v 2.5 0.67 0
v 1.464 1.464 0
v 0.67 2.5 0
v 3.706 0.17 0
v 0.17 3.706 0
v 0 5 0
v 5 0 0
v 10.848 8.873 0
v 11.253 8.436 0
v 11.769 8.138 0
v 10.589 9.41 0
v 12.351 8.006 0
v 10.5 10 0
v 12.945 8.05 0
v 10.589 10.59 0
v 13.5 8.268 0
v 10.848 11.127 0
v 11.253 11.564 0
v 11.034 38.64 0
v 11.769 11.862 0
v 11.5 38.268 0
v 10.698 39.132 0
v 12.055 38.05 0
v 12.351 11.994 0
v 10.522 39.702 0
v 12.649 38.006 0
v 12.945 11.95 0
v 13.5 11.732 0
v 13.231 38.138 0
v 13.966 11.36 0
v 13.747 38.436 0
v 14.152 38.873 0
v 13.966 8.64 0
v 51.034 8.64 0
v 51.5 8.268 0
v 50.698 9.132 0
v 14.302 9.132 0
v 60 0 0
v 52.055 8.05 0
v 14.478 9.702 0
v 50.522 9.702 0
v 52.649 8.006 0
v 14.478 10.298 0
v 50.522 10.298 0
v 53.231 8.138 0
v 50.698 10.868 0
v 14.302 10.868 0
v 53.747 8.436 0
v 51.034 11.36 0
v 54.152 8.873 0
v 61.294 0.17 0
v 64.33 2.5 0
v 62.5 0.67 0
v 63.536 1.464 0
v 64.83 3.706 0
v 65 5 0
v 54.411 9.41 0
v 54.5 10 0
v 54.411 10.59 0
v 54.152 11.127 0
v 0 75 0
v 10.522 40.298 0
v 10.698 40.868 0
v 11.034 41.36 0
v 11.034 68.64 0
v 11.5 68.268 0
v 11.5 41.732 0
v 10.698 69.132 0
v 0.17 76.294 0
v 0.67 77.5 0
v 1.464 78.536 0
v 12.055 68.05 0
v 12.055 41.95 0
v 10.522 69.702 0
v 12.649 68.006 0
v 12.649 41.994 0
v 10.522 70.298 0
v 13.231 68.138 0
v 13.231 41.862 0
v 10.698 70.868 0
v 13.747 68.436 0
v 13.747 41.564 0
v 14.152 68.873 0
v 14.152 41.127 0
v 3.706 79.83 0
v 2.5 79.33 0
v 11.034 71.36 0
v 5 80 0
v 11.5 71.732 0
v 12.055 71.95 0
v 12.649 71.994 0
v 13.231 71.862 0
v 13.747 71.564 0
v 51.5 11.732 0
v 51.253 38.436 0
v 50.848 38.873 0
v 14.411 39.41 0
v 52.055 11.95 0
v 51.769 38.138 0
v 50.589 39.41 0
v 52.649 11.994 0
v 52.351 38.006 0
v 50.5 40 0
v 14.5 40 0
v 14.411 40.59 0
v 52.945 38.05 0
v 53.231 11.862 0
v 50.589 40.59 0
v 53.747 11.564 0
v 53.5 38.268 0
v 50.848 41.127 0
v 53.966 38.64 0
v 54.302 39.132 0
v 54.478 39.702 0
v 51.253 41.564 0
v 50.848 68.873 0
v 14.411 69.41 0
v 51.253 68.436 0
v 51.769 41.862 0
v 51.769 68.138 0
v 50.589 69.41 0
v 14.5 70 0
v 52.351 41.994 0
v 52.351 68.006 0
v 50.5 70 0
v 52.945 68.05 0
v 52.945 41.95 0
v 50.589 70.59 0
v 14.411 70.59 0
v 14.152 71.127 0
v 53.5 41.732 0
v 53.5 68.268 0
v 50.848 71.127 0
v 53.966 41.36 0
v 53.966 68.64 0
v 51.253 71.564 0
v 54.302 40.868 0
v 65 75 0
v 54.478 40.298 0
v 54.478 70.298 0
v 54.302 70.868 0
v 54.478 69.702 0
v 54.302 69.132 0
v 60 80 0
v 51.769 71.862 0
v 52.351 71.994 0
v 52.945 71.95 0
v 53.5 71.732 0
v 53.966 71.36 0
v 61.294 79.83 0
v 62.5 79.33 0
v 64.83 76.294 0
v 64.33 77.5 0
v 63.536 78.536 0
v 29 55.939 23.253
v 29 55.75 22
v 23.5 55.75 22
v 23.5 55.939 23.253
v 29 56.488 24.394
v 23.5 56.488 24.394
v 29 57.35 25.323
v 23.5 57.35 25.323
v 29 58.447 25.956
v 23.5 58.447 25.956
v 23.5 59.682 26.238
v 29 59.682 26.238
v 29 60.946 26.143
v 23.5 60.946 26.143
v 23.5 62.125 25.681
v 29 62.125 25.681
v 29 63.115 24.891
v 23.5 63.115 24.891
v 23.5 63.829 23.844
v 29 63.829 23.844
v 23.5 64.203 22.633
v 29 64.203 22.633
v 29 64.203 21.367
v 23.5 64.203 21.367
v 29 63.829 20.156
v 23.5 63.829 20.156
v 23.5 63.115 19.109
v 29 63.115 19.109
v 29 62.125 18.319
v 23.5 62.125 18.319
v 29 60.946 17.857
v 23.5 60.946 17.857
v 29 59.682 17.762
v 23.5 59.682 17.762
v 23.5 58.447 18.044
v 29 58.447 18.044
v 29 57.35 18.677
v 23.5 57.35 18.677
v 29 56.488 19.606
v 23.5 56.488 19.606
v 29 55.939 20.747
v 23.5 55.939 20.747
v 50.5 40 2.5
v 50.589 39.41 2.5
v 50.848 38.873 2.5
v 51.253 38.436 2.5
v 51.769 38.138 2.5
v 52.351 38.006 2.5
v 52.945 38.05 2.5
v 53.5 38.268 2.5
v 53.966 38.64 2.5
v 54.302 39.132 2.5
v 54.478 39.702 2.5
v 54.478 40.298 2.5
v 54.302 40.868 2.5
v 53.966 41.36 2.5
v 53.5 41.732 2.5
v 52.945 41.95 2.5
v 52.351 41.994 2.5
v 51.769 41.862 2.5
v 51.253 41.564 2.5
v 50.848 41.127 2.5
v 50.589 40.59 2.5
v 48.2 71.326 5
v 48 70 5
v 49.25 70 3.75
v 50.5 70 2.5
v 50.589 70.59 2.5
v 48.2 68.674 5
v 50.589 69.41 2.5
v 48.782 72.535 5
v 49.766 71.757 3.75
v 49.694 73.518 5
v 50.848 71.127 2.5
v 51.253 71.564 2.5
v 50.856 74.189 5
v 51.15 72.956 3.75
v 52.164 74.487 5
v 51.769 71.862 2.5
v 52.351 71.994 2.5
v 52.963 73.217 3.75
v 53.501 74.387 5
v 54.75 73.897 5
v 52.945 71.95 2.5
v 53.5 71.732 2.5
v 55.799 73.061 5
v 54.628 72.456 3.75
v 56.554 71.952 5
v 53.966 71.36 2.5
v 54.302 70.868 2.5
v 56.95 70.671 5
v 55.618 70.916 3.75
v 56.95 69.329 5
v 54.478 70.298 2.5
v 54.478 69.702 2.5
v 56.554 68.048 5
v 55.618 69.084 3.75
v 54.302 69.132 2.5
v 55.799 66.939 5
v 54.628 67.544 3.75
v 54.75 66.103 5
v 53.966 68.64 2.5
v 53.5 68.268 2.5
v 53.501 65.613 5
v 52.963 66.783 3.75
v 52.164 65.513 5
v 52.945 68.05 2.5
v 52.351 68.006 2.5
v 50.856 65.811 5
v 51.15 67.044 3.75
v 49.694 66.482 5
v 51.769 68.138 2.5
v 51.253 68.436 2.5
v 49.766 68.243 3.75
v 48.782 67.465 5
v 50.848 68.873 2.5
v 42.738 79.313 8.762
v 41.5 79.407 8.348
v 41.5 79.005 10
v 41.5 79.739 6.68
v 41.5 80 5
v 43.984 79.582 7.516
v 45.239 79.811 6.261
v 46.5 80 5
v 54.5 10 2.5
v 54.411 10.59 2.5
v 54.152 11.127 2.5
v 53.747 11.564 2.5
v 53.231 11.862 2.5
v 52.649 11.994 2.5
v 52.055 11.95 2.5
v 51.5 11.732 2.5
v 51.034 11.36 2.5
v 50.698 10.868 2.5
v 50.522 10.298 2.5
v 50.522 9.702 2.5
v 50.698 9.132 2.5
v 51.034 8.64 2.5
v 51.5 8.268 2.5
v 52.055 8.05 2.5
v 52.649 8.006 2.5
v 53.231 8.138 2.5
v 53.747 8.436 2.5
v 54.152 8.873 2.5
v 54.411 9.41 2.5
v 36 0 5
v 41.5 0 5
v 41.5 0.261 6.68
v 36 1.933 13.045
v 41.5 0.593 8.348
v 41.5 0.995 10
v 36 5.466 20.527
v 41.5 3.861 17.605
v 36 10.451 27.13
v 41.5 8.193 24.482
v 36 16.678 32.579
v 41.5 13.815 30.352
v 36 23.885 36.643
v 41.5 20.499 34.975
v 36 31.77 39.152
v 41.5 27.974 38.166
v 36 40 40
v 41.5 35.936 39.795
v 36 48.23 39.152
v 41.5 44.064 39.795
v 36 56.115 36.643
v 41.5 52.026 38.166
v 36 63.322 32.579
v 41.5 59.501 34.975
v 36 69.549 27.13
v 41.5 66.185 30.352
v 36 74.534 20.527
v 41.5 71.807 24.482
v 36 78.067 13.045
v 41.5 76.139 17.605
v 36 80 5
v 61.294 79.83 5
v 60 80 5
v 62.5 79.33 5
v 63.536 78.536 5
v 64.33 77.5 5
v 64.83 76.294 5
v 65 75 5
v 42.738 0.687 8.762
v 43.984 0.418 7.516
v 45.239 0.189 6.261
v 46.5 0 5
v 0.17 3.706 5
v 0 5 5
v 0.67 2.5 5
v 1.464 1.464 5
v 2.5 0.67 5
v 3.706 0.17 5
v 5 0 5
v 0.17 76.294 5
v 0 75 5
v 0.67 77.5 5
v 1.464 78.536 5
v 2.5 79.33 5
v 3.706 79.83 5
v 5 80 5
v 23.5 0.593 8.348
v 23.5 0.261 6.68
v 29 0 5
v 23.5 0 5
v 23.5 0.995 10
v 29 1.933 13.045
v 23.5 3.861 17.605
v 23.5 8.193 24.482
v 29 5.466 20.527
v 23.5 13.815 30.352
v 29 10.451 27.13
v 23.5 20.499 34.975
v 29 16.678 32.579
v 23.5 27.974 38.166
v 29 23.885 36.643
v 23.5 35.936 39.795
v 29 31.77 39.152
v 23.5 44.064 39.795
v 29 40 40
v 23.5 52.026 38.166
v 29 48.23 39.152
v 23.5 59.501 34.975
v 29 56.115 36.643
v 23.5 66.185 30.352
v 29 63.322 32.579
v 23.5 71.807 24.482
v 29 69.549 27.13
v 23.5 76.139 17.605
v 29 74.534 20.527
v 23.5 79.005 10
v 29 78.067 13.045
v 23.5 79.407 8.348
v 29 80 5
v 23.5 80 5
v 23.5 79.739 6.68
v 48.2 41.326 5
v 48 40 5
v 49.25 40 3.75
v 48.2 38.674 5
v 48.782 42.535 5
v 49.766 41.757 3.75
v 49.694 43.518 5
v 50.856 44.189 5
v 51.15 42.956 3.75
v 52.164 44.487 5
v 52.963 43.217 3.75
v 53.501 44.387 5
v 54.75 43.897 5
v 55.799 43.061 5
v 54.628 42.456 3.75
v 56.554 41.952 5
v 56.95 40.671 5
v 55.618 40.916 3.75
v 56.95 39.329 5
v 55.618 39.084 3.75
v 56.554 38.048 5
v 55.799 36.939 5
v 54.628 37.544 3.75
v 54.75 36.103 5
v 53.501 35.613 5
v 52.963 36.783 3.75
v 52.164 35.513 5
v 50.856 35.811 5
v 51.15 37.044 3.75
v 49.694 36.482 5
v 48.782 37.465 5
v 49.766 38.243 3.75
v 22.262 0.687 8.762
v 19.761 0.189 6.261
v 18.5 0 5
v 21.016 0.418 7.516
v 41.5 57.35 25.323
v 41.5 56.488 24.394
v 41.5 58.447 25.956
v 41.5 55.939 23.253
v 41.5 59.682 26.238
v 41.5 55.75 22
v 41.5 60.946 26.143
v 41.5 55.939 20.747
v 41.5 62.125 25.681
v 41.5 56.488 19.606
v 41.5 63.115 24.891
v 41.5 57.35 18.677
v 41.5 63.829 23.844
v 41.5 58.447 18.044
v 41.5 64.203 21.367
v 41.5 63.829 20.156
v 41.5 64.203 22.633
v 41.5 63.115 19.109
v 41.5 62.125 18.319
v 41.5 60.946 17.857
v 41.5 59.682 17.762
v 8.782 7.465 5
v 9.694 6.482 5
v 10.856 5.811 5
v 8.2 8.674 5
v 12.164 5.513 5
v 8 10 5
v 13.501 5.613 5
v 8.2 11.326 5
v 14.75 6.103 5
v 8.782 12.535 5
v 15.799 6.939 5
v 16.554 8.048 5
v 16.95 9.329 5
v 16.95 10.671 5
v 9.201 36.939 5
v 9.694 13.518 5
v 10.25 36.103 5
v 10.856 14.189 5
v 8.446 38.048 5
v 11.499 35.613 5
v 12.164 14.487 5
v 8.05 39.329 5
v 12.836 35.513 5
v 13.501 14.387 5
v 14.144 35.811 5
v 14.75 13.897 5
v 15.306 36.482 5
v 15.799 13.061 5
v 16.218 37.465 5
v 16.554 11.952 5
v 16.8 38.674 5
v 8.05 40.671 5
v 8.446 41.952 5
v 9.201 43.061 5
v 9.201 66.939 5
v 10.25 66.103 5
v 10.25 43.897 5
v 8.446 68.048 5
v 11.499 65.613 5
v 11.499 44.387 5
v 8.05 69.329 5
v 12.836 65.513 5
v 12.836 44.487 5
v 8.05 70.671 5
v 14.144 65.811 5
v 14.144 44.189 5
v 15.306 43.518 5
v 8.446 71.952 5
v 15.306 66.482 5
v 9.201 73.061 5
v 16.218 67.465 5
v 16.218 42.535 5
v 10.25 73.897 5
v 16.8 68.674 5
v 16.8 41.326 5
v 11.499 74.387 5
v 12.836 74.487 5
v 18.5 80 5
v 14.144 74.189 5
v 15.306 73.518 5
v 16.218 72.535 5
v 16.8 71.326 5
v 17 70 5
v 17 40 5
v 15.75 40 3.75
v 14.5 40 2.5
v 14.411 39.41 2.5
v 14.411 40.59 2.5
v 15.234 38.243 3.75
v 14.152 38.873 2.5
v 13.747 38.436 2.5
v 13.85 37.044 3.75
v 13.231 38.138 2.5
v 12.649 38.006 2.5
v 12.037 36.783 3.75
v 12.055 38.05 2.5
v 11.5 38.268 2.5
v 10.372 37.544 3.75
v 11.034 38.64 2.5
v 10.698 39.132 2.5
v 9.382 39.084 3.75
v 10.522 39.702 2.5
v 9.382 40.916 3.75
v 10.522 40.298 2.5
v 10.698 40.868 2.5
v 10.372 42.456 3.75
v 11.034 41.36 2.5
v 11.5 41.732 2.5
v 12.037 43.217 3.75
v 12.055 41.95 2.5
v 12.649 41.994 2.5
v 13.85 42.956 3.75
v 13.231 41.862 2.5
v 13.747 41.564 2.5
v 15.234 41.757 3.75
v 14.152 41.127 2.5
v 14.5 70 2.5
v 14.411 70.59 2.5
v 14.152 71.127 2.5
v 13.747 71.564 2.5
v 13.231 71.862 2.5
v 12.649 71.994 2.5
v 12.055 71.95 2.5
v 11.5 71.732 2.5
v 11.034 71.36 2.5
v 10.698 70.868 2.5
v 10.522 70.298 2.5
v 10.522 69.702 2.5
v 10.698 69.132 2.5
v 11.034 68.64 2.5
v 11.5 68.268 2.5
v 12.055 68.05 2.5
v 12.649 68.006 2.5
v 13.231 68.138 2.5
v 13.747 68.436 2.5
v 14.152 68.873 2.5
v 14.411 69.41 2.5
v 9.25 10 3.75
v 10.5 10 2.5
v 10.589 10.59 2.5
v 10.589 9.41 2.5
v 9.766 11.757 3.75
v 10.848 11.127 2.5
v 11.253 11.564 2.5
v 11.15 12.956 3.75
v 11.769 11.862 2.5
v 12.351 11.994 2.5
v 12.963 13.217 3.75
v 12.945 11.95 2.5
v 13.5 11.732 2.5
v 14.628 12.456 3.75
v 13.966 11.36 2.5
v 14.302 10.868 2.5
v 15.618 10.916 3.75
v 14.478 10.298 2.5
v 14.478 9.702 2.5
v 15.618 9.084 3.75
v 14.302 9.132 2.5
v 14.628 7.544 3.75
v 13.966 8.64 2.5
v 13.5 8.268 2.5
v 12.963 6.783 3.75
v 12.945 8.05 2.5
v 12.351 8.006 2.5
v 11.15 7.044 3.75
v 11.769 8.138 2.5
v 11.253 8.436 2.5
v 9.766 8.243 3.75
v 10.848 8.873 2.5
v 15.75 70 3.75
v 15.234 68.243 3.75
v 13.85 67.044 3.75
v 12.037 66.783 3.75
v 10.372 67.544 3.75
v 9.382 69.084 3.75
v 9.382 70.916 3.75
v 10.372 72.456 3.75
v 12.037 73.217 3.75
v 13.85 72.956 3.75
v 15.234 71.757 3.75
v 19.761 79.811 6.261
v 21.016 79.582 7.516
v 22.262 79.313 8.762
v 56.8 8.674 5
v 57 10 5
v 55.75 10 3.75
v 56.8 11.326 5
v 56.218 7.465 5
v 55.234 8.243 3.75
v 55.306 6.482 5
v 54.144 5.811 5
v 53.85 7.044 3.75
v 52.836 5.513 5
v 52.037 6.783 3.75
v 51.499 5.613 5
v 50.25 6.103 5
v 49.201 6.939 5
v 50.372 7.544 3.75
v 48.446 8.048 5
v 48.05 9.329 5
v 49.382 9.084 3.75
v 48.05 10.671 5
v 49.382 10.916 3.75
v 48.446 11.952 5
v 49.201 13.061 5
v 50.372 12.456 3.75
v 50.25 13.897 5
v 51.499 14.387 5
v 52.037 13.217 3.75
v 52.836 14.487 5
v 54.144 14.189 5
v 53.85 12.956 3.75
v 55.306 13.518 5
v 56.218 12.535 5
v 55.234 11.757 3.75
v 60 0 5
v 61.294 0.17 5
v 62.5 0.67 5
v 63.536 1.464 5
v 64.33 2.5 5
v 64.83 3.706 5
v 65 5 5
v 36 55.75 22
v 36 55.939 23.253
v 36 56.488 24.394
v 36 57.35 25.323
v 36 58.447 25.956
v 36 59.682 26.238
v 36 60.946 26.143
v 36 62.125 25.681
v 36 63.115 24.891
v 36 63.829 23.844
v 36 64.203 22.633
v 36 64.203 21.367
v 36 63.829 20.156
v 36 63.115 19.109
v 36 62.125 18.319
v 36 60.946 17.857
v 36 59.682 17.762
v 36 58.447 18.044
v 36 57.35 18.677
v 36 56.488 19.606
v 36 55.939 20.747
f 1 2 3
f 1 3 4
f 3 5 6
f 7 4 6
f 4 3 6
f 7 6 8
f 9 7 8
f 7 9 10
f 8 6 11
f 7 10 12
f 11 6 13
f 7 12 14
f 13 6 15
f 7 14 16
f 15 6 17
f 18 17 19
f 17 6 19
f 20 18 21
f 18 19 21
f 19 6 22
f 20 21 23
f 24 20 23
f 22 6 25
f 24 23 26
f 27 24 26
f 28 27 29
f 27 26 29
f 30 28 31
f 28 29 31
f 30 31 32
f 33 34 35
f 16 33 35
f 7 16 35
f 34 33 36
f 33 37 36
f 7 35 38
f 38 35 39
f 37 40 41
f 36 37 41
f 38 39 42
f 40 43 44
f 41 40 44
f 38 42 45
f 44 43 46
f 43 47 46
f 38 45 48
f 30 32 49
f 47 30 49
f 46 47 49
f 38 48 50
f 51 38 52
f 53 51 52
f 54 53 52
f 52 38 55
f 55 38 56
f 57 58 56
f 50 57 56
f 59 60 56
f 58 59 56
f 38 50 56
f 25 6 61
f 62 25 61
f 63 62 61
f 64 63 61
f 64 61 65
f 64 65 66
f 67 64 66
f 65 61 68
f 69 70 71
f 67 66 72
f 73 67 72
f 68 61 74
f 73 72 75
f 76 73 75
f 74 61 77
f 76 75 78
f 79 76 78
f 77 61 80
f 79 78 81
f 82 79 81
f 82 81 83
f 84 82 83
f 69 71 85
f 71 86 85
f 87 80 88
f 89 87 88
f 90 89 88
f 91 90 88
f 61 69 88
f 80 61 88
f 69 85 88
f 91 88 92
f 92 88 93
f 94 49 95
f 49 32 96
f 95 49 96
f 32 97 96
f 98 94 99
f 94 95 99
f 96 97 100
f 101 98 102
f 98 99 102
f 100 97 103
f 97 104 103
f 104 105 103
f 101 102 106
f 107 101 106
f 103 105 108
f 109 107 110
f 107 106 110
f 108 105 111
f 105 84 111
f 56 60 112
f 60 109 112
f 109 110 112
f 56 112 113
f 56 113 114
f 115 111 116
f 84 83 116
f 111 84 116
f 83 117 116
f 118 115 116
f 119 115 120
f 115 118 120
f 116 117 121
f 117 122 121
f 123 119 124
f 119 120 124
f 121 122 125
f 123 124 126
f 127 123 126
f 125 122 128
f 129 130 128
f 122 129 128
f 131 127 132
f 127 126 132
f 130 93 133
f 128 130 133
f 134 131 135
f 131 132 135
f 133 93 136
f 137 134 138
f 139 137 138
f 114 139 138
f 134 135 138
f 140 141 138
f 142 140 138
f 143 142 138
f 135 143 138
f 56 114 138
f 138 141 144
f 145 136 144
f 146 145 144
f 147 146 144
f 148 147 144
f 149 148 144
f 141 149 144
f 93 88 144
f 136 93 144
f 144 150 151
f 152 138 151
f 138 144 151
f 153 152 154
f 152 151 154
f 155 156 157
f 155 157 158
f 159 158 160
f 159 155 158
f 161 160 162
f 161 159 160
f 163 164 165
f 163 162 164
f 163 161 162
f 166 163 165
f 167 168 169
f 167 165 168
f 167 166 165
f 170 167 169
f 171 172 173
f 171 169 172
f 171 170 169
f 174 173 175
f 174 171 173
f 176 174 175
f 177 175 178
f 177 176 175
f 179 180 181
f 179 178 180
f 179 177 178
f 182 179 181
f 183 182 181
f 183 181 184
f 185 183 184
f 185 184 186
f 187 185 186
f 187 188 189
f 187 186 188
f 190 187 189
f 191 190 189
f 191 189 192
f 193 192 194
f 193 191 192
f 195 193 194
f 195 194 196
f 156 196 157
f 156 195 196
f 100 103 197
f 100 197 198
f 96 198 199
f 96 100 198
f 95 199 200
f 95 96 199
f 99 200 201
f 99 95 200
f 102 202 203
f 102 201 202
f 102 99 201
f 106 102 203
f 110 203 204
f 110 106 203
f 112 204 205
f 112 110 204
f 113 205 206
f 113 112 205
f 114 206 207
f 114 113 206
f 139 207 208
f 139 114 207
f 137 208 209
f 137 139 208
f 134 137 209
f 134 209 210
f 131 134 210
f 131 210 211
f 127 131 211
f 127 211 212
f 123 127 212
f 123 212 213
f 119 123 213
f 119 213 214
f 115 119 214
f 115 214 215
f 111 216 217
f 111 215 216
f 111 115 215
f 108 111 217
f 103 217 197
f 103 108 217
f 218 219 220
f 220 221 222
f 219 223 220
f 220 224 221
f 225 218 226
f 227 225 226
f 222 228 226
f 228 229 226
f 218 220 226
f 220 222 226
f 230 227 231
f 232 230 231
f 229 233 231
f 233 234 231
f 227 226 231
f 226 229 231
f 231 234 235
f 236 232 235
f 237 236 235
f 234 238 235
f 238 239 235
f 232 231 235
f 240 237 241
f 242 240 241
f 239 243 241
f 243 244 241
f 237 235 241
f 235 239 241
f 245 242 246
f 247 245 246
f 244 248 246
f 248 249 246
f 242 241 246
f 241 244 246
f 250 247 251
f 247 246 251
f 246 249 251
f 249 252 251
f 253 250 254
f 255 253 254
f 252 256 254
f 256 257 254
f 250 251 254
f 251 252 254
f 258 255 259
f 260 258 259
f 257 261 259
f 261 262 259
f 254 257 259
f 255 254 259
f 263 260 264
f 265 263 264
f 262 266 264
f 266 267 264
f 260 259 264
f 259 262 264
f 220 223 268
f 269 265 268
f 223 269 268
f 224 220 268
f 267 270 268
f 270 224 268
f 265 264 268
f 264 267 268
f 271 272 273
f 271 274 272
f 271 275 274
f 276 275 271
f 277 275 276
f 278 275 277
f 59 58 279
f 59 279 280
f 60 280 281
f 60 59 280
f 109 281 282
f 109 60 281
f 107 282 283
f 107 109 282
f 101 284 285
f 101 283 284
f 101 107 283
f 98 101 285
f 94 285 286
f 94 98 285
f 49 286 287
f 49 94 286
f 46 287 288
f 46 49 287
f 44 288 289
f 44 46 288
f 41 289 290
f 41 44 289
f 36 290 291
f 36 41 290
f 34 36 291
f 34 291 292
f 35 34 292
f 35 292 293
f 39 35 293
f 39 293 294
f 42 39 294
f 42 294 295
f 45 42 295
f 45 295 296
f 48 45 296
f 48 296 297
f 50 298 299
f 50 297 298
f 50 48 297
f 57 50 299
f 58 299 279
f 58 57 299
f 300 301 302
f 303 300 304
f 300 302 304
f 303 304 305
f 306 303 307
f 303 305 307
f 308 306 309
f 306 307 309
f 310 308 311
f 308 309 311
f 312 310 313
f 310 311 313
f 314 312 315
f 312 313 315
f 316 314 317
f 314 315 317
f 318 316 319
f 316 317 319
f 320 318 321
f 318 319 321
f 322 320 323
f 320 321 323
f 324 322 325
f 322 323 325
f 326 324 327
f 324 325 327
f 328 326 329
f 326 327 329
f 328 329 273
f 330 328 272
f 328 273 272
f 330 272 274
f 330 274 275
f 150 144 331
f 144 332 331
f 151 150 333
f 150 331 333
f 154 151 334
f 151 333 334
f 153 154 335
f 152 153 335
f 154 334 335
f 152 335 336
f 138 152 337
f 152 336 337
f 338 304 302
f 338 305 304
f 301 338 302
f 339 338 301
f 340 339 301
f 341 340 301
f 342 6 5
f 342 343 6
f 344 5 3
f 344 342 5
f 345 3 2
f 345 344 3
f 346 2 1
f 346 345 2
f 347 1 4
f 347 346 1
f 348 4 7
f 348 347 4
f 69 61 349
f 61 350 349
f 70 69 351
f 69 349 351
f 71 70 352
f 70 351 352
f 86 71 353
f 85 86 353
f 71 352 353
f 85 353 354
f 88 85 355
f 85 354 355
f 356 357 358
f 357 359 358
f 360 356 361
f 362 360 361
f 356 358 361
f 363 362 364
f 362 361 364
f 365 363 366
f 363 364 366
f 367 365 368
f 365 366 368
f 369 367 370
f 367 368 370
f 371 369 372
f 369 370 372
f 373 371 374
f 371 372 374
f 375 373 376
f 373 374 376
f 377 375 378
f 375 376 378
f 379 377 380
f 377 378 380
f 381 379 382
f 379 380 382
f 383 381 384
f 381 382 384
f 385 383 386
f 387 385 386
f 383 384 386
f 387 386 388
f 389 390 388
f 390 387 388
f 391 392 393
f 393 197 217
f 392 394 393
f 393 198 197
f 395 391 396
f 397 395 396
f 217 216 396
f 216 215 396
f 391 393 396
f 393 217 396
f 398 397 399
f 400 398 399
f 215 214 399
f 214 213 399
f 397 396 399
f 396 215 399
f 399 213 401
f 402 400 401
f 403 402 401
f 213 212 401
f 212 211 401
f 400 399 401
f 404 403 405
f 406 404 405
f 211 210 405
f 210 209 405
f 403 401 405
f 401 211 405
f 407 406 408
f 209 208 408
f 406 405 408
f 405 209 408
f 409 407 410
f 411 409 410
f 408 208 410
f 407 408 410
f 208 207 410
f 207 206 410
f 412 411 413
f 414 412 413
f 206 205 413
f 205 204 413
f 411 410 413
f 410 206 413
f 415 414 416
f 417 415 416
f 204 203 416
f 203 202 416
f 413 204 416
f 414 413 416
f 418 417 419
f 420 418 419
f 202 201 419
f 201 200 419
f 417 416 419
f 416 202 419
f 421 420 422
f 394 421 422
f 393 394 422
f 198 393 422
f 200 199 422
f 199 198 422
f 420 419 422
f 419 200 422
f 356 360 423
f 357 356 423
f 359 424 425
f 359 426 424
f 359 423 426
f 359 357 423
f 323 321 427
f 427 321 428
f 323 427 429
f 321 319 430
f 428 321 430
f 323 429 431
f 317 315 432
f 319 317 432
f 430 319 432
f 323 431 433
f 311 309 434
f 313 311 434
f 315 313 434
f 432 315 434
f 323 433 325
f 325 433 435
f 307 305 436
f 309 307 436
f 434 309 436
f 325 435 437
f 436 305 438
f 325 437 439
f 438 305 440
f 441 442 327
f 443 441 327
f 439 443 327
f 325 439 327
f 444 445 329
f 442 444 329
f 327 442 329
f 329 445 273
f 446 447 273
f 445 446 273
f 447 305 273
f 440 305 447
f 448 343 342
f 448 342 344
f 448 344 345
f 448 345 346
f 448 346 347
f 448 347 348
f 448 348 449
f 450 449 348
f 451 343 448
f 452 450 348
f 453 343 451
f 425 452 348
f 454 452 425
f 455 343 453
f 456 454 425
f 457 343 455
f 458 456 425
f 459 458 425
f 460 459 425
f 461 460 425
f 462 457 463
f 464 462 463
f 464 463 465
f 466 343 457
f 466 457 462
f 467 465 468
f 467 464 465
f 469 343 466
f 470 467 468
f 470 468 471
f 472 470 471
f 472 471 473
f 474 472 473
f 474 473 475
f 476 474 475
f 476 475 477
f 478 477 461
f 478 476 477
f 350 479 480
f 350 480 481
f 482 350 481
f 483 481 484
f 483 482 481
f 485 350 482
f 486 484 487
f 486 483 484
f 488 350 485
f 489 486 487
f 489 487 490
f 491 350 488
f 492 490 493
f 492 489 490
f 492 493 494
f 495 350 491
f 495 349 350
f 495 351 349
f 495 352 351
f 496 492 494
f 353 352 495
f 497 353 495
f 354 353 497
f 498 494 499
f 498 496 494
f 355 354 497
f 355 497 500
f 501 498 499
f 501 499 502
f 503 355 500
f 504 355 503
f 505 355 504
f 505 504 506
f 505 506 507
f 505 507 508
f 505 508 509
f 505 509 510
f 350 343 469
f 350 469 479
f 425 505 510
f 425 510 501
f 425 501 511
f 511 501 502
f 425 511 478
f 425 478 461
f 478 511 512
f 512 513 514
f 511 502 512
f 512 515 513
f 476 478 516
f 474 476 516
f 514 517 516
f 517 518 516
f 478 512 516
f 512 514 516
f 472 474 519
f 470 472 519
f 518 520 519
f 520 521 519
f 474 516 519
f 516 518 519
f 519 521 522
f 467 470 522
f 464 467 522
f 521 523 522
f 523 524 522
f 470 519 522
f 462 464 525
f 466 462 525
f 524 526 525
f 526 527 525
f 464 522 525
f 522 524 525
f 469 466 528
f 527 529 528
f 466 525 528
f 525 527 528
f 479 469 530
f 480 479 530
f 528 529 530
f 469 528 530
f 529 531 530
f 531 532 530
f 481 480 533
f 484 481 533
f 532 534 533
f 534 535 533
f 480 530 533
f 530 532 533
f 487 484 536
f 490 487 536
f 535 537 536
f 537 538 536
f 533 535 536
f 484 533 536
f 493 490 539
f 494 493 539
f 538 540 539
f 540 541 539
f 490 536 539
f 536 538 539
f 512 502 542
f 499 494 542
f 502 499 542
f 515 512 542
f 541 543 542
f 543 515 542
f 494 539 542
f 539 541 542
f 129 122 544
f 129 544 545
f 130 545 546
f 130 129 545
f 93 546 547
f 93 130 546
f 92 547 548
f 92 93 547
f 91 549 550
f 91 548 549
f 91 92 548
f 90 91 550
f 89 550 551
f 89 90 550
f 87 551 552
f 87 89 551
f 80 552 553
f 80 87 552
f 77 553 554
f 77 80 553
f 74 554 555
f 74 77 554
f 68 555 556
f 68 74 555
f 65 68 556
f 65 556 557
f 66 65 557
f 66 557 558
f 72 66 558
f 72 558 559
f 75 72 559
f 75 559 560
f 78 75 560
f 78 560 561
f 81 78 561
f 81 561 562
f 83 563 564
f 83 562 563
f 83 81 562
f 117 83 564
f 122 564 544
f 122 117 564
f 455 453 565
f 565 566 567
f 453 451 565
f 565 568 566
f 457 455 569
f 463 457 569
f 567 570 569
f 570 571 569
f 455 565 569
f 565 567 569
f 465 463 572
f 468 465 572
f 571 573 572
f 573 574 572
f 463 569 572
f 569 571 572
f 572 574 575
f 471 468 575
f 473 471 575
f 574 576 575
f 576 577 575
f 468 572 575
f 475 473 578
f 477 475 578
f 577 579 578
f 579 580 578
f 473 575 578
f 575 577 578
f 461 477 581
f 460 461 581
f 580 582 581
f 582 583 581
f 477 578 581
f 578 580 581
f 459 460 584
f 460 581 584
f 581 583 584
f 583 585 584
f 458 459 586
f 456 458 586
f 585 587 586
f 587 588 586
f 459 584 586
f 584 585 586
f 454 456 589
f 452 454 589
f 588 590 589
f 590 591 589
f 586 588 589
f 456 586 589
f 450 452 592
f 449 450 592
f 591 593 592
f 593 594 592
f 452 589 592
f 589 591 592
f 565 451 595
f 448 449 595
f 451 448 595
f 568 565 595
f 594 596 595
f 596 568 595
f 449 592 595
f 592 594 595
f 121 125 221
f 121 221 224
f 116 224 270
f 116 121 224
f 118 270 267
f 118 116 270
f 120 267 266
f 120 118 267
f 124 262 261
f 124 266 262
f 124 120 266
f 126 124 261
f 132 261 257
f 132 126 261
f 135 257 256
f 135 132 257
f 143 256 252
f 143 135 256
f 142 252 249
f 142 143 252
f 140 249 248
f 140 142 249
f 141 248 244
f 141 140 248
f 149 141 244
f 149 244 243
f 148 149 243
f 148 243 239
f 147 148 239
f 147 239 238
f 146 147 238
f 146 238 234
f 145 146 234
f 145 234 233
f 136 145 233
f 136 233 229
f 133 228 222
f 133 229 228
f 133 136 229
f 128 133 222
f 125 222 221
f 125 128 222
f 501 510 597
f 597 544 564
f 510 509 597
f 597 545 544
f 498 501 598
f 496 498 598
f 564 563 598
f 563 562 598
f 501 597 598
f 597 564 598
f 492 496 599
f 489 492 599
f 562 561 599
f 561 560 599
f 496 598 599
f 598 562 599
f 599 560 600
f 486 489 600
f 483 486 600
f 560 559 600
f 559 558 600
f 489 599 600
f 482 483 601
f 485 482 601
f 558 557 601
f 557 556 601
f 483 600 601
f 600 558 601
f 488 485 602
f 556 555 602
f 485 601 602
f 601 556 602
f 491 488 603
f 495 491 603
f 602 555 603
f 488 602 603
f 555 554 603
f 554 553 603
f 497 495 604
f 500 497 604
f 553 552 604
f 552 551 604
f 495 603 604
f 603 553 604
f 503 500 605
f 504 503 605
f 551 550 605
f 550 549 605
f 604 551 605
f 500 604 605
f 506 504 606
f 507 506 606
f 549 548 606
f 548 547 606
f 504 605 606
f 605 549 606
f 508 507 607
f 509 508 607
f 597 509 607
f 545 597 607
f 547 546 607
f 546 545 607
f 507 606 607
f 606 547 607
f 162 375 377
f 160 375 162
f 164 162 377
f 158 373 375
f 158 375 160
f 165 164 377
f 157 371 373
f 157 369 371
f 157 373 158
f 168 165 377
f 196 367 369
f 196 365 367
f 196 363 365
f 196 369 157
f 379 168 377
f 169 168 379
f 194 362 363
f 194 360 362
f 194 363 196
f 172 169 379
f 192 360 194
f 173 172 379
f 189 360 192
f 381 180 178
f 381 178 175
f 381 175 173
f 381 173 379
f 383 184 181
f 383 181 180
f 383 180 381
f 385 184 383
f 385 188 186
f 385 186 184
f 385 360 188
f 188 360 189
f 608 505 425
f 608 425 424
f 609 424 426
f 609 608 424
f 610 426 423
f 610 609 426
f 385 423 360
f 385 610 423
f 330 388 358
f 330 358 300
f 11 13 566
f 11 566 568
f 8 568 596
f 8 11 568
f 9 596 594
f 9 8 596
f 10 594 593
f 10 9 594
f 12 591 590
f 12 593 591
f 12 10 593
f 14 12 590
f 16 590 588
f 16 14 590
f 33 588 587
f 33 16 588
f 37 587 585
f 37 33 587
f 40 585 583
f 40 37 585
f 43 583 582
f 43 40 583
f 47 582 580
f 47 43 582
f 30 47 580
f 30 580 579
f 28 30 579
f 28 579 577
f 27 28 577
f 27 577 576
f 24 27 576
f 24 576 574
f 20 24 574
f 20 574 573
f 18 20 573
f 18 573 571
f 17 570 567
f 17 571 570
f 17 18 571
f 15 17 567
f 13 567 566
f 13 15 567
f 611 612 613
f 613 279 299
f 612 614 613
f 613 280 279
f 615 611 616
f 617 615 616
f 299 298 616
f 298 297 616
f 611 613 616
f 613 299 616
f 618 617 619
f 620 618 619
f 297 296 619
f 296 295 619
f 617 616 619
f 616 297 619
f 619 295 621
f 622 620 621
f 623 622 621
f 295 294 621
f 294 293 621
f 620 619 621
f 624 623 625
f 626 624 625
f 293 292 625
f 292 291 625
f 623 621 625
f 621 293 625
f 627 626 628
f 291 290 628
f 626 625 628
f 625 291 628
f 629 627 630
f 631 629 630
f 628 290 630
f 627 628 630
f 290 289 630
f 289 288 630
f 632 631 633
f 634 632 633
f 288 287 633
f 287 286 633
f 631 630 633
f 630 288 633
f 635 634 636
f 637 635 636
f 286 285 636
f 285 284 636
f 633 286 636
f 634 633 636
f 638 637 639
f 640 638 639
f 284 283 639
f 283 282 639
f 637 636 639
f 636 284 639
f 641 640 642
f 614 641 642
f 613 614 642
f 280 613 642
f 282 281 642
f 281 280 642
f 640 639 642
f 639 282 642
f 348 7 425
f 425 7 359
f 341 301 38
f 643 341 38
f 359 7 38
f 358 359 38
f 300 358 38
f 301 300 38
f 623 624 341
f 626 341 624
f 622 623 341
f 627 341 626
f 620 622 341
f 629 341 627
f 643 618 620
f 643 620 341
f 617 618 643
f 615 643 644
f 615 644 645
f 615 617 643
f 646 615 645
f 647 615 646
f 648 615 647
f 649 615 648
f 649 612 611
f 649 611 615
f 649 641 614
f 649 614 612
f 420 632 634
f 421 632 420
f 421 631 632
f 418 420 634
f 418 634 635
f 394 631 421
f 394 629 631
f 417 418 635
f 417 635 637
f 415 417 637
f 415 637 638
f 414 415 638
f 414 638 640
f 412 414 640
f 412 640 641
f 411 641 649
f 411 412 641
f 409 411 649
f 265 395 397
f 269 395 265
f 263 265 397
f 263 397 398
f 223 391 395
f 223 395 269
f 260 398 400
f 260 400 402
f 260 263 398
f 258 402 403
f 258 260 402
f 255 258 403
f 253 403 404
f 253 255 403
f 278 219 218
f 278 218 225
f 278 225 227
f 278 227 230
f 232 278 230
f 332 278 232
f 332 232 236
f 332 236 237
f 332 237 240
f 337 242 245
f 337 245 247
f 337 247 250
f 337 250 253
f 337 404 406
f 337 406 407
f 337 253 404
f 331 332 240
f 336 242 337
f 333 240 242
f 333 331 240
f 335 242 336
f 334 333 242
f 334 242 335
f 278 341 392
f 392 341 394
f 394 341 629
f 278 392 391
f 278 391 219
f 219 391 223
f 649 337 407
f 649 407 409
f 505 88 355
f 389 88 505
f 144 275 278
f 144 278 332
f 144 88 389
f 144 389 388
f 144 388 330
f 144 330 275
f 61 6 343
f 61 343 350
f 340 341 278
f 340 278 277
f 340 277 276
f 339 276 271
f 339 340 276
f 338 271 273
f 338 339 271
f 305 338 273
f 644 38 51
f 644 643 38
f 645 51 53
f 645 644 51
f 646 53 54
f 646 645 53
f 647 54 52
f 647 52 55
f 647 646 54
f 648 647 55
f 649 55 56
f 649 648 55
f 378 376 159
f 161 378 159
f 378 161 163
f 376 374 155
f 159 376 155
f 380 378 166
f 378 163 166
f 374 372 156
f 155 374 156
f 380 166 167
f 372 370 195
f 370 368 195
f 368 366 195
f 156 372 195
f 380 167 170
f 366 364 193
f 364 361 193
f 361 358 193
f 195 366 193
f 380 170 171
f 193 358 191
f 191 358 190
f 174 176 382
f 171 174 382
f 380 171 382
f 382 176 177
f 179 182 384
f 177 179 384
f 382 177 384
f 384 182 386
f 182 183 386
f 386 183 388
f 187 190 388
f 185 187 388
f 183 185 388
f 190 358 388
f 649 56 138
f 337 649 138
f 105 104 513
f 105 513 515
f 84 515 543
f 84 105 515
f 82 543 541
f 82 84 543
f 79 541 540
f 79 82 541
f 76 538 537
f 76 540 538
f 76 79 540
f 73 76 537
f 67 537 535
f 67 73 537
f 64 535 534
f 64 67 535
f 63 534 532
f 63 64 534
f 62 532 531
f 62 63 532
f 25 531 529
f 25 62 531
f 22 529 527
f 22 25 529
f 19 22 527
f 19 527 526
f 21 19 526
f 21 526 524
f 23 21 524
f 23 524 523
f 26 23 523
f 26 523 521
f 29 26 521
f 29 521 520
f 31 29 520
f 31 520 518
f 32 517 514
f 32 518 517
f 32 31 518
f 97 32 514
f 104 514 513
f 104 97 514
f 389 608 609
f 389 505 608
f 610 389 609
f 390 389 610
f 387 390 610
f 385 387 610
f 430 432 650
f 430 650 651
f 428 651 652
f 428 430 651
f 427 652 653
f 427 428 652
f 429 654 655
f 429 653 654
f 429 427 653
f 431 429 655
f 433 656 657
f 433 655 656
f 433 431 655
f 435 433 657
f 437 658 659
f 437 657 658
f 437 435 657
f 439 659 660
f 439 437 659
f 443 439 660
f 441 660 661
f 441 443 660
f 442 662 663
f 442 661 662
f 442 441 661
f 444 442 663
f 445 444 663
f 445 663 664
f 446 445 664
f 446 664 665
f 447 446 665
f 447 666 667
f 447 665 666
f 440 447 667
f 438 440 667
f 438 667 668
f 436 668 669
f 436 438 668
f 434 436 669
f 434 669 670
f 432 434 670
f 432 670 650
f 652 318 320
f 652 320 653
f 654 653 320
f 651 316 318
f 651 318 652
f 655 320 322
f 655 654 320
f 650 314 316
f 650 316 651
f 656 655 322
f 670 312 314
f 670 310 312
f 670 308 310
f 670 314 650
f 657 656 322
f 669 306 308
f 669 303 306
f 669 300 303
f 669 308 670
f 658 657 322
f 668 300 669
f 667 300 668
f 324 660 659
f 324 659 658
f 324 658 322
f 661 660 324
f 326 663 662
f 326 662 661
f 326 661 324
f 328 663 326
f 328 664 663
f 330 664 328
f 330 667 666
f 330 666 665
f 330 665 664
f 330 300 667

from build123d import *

# Parameters (mm, degrees)
ESQUISSE1_W                  = 65
ESQUISSE1_H                  = 80
BOSS_EXTRU_1_DEPTH           = 5
ENL_V_MAT_EXTRU_1_DEPTH      = 104.198837203
ENL_V_MAT_EXTRU_1_DEPTH_BACK = 104.198837203
ESQUISSE2_R                  = 2
ESQUISSE3_W                  = 18
ESQUISSE3_H                  = 80
BOSS_EXTRU_2_DEPTH           = 35
ENL_V_MAT_EXTRU_2_DEPTH      = 99.601470577
ENL_V_MAT_EXTRU_2_DEPTH_BACK = 99.601470577
ENL_V_MAT_EXTRU_3_DEPTH      = 99.601470577
ENL_V_MAT_EXTRU_3_DEPTH_BACK = 99.601470577
ESQUISSE5_R                  = 4.25
ESQUISSE6_W                  = 7
ESQUISSE6_H                  = 80
ENL_V_MAT_EXTRU_4_DEPTH      = 109.857705285
CHANFREIN1_SIZE              = 5
CHANFREIN2_SIZE              = 2.5
CONG_1_R                     = 5


with BuildPart() as part:
    # Esquisse1 → Boss.-Extru.1 (new body)
    with BuildSketch(Plane.XY):
        with Locations((32.5, 40)):
            Rectangle(ESQUISSE1_W, ESQUISSE1_H)
    extrude(amount=BOSS_EXTRU_1_DEPTH)

    # Esquisse2 → Enlèv. mat.-Extru.1 (cut, two sides: drawn at the far end of the back side and taken through both)
    with BuildSketch(Plane.XY.offset(5).offset(-ENL_V_MAT_EXTRU_1_DEPTH_BACK)):
        with Locations((12.5, 70)):
            Circle(ESQUISSE2_R)
        with Locations(Location((12.5, 10, 0), (0, 0, 180))):
            Circle(ESQUISSE2_R)
        with Locations((12.5, 40)):
            Circle(ESQUISSE2_R)
        with Locations(Location((52.5, 40, 0), (0, 0, 180))):
            Circle(ESQUISSE2_R)
        with Locations((52.5, 10)):
            Circle(ESQUISSE2_R)
        with Locations(Location((52.5, 70, 0), (0, 0, 180))):
            Circle(ESQUISSE2_R)
    extrude(amount=ENL_V_MAT_EXTRU_1_DEPTH + ENL_V_MAT_EXTRU_1_DEPTH_BACK, mode=Mode.SUBTRACT)

    # Esquisse3 → Boss.-Extru.2 (add)
    with BuildSketch(Plane.XY.offset(5)):
        with Locations((32.5, 40)):
            Rectangle(ESQUISSE3_W, ESQUISSE3_H)
    extrude(amount=BOSS_EXTRU_2_DEPTH)

    # Esquisse4 → Enlèv. mat.-Extru.2 (cut, two sides: drawn at the far end of the back side and taken through both)
    with BuildSketch(Plane.ZY.offset(-23.5).offset(-ENL_V_MAT_EXTRU_2_DEPTH_BACK)):
        with BuildLine():
            Line((5, 80), (41, 80))
            Line((41, 80), (41, 0))
            Line((41, 0), (5, 0))
            ThreePointArc((5, 0), (40, 40), (5, 80))
        make_face()
    extrude(amount=ENL_V_MAT_EXTRU_2_DEPTH + ENL_V_MAT_EXTRU_2_DEPTH_BACK, mode=Mode.SUBTRACT)

    # Esquisse5 → Enlèv. mat.-Extru.3 (cut, two sides: drawn at the far end of the back side and taken through both)
    with BuildSketch(Plane.ZY.offset(-23.5).offset(-ENL_V_MAT_EXTRU_3_DEPTH_BACK)):
        with Locations(Location((22, 60, 0), (0, 0, 270))):
            Circle(ESQUISSE5_R)
    extrude(amount=ENL_V_MAT_EXTRU_3_DEPTH + ENL_V_MAT_EXTRU_3_DEPTH_BACK, mode=Mode.SUBTRACT)

    # Esquisse6 → Enlèv. mat.-Extru.4 (cut, through all)
    with BuildSketch(Plane.XY.offset(5)):
        with Locations((32.5, 40)):
            Rectangle(ESQUISSE6_W, ESQUISSE6_H)
    extrude(amount=ENL_V_MAT_EXTRU_4_DEPTH, mode=Mode.SUBTRACT)

    # Chanfrein1
    # the kernel refuses this chamfer: 5 mm, written as the material it adds along each edge
    with BuildSketch(Plane(origin=(41.5, 0, 5), x_dir=(0.9996219169112968, 0, -0.027495876610586317), z_dir=(0, 1, 0))) as chanfrein1_piece_1_section:
        Polygon((CHANFREIN1_SIZE * 0.999621916911, -CHANFREIN1_SIZE * 0.0274958766106), (-CHANFREIN1_SIZE * 0.0274958766106, -CHANFREIN1_SIZE * 0.999621916911), (0, 0), align=None)
    chanfrein1_piece_1 = extrude(amount=80, mode=Mode.PRIVATE)
    chanfrein1_piece_1 = chanfrein1_piece_1 & Plane(origin=(43.152902744, 40, -0.357142857), x_dir=(0, -0.9911504424778762, 0.13274336283185842), z_dir=(1, 0, 0)) * Cylinder(40.357142857, 180, mode=Mode.PRIVATE)
    add(chanfrein1_piece_1)
    with BuildSketch(Plane(origin=(23.5, 80, 5), x_dir=(-0.9996219169112968, 0, -0.027495876610586317), z_dir=(0, -1, 0))) as chanfrein1_piece_2_section:
        Polygon((CHANFREIN1_SIZE * 0.999621916911, -CHANFREIN1_SIZE * 0.0274958766106), (-CHANFREIN1_SIZE * 0.0274958766106, -CHANFREIN1_SIZE * 0.999621916911), (0, 0), align=None)
    chanfrein1_piece_2 = extrude(amount=80, mode=Mode.PRIVATE)
    chanfrein1_piece_2 = chanfrein1_piece_2 & Plane(origin=(21.847097256, 40, -0.357142857), x_dir=(0, -0.9911504424778762, 0.13274336283185842), z_dir=(1, 0, 0)) * Cylinder(40.357142857, 180, mode=Mode.PRIVATE)
    add(chanfrein1_piece_2)

    # Chanfrein2
    chanfrein2_edges = [part.edges().sort_by_distance(p)[0] for p in [
        (10.5, 70, 5),
        (14.5, 10, 5),
        (10.5, 40, 5),
        (54.5, 70, 5),
        (50.5, 10, 5),
        (54.5, 40, 5),
    ]]
    chamfer(chanfrein2_edges, length=CHANFREIN2_SIZE)

    # Congé1
    cong_1_edges = [part.edges().sort_by_distance(p)[0] for p in [
        (0, 80, 2.5),
        (65, 80, 2.5),
        (65, 0, 2.5),
        (0, 0, 2.5),
    ]]
    fillet(cong_1_edges, radius=CONG_1_R)


solid = part.part
